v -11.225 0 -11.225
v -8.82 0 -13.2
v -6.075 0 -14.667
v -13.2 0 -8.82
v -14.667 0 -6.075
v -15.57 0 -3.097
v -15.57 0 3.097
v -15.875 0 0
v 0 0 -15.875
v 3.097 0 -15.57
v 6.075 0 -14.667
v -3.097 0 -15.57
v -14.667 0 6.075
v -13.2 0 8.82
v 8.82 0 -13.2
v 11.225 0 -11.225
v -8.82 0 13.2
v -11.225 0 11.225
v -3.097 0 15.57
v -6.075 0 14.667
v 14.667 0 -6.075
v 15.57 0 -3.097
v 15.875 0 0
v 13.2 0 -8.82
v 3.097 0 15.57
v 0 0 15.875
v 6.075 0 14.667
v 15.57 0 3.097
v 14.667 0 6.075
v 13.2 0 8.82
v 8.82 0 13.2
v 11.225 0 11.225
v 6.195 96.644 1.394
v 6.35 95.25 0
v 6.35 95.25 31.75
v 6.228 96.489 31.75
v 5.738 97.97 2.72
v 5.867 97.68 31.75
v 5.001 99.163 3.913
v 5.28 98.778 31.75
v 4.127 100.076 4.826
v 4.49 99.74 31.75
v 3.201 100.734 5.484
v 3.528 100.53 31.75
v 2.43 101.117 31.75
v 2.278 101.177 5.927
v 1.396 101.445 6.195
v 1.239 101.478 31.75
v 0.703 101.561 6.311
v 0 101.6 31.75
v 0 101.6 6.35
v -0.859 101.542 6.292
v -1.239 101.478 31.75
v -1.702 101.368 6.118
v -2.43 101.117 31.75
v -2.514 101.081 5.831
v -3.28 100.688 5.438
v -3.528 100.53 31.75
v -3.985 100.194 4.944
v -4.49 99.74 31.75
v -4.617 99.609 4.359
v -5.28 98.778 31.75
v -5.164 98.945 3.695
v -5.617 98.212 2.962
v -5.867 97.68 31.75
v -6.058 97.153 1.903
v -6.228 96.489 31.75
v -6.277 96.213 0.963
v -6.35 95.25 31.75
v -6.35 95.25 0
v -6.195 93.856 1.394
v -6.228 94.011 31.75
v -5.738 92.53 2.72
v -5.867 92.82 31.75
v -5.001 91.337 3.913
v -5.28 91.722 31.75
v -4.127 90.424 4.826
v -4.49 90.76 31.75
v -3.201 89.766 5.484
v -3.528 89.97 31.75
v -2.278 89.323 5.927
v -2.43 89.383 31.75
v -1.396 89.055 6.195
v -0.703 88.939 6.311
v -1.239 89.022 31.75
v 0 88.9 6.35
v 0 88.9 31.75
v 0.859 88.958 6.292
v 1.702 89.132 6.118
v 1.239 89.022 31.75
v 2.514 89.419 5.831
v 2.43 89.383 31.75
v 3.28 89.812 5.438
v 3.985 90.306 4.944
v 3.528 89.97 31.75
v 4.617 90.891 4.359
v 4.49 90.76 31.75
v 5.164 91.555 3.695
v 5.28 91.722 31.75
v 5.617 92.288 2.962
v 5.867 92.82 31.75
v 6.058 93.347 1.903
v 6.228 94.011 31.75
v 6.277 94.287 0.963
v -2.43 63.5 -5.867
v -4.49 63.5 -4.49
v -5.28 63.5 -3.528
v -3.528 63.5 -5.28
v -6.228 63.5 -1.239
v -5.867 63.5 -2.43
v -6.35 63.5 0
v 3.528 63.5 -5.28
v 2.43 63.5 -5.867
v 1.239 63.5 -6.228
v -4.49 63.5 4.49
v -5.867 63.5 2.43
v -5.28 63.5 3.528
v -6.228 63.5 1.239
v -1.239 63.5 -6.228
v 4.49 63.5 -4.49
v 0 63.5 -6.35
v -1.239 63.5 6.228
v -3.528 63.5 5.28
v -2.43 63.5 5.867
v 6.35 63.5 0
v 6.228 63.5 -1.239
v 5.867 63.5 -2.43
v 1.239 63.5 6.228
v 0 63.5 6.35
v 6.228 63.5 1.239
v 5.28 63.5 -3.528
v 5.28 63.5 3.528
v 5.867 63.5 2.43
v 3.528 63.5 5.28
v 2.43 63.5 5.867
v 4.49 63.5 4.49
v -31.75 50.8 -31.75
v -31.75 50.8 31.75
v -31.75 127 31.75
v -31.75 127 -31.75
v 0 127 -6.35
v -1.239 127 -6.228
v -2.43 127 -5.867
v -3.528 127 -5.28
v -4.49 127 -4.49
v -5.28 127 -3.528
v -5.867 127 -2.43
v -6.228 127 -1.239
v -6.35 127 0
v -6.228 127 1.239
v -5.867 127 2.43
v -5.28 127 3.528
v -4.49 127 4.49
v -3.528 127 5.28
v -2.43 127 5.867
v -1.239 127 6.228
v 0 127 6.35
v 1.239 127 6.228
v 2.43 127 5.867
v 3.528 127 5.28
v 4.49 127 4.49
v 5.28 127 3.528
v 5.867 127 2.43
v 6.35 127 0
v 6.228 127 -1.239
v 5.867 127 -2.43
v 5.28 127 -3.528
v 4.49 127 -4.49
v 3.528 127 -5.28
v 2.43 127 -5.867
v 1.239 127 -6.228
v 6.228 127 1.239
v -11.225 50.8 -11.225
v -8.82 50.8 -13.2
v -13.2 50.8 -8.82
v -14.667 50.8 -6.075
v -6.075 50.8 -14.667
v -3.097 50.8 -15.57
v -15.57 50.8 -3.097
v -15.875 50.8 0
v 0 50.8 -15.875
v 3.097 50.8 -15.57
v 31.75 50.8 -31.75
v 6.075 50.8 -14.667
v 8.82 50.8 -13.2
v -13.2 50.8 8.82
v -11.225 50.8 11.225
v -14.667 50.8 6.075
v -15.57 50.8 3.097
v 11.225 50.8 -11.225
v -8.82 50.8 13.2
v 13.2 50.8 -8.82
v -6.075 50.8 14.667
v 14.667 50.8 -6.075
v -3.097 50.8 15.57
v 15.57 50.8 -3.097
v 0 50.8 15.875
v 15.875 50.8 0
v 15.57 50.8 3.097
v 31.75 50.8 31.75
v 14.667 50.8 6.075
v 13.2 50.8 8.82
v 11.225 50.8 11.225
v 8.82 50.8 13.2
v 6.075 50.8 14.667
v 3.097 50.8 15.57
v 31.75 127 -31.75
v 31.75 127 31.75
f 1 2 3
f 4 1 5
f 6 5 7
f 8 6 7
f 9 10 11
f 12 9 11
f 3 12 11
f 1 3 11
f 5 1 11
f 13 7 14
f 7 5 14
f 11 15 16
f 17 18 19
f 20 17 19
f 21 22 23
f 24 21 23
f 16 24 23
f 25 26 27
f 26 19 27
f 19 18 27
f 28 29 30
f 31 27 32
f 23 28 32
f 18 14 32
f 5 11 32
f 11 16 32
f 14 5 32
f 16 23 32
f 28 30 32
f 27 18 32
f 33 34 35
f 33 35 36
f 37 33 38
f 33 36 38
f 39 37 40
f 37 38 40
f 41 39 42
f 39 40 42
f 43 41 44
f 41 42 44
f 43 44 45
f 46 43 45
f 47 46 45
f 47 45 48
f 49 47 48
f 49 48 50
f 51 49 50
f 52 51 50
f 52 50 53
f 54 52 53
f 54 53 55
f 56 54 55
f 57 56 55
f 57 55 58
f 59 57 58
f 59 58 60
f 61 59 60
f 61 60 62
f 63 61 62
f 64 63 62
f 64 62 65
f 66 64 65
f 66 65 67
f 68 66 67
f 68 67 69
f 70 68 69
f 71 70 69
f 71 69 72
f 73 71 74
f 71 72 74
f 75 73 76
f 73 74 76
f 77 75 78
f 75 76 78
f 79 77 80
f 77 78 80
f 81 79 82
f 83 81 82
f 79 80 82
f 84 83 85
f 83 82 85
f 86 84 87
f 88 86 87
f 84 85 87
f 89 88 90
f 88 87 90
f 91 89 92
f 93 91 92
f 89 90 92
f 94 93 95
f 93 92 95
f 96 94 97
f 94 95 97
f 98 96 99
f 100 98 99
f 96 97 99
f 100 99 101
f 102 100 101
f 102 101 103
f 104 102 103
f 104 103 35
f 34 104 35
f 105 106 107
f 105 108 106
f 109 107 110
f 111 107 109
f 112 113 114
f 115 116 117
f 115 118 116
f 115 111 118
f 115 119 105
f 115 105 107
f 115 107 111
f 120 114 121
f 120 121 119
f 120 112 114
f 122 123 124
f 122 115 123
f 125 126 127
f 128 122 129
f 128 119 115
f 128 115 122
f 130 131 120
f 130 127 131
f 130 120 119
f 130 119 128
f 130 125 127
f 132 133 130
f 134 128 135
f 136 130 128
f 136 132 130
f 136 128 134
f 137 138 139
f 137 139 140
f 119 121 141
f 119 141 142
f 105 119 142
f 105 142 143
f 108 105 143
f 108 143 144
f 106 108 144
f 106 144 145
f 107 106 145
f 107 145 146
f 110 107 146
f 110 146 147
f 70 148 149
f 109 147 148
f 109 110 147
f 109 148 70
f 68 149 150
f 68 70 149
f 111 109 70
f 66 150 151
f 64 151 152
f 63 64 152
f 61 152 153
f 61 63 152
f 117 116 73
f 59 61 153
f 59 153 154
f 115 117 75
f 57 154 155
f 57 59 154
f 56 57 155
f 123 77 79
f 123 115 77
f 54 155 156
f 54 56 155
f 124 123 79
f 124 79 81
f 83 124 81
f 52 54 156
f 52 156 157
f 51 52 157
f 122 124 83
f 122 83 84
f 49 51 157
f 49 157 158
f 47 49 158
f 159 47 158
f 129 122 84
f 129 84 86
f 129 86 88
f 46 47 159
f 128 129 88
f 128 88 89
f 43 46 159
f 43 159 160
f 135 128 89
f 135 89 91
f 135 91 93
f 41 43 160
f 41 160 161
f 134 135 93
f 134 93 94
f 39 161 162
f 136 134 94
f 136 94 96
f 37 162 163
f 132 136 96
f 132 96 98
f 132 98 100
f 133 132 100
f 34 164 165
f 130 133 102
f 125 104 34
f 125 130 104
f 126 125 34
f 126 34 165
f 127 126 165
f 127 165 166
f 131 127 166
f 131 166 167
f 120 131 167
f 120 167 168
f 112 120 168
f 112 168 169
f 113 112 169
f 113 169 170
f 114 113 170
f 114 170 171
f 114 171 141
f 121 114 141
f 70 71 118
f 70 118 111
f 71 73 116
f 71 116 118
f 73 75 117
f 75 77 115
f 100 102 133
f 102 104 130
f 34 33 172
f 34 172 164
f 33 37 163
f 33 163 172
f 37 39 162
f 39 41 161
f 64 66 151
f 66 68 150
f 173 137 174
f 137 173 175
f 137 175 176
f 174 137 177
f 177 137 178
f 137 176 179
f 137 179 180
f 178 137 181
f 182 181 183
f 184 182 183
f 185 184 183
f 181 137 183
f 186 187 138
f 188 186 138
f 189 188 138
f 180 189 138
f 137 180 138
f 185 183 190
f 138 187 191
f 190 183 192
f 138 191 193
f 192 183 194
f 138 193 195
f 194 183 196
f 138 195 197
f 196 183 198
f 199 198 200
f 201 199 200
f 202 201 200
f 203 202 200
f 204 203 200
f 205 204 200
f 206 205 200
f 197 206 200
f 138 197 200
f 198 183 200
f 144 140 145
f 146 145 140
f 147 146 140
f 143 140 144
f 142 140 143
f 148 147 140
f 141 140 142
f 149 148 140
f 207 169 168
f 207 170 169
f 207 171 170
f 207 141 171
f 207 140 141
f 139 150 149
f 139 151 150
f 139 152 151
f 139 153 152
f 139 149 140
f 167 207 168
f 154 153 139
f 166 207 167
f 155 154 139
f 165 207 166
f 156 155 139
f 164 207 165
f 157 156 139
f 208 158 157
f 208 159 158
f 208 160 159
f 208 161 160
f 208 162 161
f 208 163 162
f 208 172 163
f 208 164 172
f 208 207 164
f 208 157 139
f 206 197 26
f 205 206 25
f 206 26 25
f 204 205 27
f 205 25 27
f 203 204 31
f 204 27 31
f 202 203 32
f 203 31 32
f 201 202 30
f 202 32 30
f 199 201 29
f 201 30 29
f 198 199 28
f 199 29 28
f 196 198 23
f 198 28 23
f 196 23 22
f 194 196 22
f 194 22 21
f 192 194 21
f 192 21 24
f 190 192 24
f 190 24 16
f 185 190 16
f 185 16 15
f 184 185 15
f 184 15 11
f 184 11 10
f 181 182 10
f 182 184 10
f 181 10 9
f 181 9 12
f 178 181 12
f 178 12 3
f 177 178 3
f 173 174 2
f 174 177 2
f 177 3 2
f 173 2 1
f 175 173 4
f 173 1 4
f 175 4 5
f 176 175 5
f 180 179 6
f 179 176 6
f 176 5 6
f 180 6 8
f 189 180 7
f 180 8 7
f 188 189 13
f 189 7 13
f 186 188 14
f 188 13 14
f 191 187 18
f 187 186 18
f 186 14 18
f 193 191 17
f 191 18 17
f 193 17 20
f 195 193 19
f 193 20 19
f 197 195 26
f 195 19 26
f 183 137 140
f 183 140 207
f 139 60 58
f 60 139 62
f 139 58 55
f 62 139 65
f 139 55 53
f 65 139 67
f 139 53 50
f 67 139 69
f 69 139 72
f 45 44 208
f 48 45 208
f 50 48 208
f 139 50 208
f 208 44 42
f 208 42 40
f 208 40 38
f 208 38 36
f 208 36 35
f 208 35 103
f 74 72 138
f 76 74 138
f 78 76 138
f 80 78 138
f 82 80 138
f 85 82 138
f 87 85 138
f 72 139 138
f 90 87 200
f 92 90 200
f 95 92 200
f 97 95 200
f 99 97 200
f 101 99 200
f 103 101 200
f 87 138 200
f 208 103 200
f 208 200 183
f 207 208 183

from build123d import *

# Parameters (mm, degrees)
SKETCH3_R               = 15.875
BOSS_EXTRUDE1_DEPTH     = 63.5
BOSS_EXTRUDE2_START     = -12.7
SKETCH4_W               = 63.5
SKETCH4_H               = 63.5
SKETCH4_R               = 15.875
SKETCH4_R_2             = 6.35
BOSS_EXTRUDE2_DEPTH     = 76.2
CUT_EXTRUDE1_REACH      = 147.497
CUT_EXTRUDE1_END_RADIUS = 6.35
SKETCH5_R               = 6.35


with BuildPart() as part:
    # Sketch3 → Boss-Extrude1 (new body)
    with BuildSketch(Plane(origin=(0, 0, 0), x_dir=(1, 0, 0), z_dir=(0, 1, 0))):
        with Locations(Location((0, 0, 0), (0, 0, 270))):
            Circle(SKETCH3_R)
    extrude(amount=BOSS_EXTRUDE1_DEPTH)


with BuildPart() as body_2:
    # Sketch4 → Boss-Extrude2 (new body)
    # profile 1 of 2: a face of its own
    with BuildSketch(Plane(origin=(0, 63.5, 0), x_dir=(1, 0, 0), z_dir=(0, 1, 0)).offset(BOSS_EXTRUDE2_START)):
        Rectangle(SKETCH4_W, SKETCH4_H)
        with Locations(Location((0, 0, 0), (0, 0, 270))):
            Circle(SKETCH4_R, mode=Mode.SUBTRACT)
    # profile 2 of 2: a face of its own
    with BuildSketch(Plane(origin=(0, 63.5, 0), x_dir=(1, 0, 0), z_dir=(0, 1, 0)).offset(BOSS_EXTRUDE2_START)):
        with Locations(Location((0, 0, 0), (0, 0, 270))):
            Circle(SKETCH4_R)
        with Locations(Location((0, 0, 0), (0, 0, 90))):
            Circle(SKETCH4_R_2, mode=Mode.SUBTRACT)
    extrude(amount=BOSS_EXTRUDE2_DEPTH)

    # Cut-Extrude1: up to this cylinder (the profile starts outside it)
    cut_extrude1_end = Plane(origin=(0, 95.25, 0), z_dir=(0, -1, 0)) * Cylinder(CUT_EXTRUDE1_END_RADIUS, 308.694, mode=Mode.PRIVATE)
    # Sketch5 → Cut-Extrude1 (cut, up to the surface)
    with BuildSketch(Plane.XY.offset(31.75), mode=Mode.PRIVATE) as cut_extrude1_sk1:
        with Locations((0, 95.25)):
            Circle(SKETCH5_R)
    cut_extrude1_tool1 = extrude(cut_extrude1_sk1.sketch, amount=-CUT_EXTRUDE1_REACH, mode=Mode.PRIVATE) - cut_extrude1_end
    add(cut_extrude1_tool1.solids().sort_by_distance((0, 95.25, 31.75))[0], mode=Mode.SUBTRACT)


with BuildPart() as part_1:
    add(part.part)

    # Combine1: union body 2
    add(body_2.part)


solid = part_1.part
